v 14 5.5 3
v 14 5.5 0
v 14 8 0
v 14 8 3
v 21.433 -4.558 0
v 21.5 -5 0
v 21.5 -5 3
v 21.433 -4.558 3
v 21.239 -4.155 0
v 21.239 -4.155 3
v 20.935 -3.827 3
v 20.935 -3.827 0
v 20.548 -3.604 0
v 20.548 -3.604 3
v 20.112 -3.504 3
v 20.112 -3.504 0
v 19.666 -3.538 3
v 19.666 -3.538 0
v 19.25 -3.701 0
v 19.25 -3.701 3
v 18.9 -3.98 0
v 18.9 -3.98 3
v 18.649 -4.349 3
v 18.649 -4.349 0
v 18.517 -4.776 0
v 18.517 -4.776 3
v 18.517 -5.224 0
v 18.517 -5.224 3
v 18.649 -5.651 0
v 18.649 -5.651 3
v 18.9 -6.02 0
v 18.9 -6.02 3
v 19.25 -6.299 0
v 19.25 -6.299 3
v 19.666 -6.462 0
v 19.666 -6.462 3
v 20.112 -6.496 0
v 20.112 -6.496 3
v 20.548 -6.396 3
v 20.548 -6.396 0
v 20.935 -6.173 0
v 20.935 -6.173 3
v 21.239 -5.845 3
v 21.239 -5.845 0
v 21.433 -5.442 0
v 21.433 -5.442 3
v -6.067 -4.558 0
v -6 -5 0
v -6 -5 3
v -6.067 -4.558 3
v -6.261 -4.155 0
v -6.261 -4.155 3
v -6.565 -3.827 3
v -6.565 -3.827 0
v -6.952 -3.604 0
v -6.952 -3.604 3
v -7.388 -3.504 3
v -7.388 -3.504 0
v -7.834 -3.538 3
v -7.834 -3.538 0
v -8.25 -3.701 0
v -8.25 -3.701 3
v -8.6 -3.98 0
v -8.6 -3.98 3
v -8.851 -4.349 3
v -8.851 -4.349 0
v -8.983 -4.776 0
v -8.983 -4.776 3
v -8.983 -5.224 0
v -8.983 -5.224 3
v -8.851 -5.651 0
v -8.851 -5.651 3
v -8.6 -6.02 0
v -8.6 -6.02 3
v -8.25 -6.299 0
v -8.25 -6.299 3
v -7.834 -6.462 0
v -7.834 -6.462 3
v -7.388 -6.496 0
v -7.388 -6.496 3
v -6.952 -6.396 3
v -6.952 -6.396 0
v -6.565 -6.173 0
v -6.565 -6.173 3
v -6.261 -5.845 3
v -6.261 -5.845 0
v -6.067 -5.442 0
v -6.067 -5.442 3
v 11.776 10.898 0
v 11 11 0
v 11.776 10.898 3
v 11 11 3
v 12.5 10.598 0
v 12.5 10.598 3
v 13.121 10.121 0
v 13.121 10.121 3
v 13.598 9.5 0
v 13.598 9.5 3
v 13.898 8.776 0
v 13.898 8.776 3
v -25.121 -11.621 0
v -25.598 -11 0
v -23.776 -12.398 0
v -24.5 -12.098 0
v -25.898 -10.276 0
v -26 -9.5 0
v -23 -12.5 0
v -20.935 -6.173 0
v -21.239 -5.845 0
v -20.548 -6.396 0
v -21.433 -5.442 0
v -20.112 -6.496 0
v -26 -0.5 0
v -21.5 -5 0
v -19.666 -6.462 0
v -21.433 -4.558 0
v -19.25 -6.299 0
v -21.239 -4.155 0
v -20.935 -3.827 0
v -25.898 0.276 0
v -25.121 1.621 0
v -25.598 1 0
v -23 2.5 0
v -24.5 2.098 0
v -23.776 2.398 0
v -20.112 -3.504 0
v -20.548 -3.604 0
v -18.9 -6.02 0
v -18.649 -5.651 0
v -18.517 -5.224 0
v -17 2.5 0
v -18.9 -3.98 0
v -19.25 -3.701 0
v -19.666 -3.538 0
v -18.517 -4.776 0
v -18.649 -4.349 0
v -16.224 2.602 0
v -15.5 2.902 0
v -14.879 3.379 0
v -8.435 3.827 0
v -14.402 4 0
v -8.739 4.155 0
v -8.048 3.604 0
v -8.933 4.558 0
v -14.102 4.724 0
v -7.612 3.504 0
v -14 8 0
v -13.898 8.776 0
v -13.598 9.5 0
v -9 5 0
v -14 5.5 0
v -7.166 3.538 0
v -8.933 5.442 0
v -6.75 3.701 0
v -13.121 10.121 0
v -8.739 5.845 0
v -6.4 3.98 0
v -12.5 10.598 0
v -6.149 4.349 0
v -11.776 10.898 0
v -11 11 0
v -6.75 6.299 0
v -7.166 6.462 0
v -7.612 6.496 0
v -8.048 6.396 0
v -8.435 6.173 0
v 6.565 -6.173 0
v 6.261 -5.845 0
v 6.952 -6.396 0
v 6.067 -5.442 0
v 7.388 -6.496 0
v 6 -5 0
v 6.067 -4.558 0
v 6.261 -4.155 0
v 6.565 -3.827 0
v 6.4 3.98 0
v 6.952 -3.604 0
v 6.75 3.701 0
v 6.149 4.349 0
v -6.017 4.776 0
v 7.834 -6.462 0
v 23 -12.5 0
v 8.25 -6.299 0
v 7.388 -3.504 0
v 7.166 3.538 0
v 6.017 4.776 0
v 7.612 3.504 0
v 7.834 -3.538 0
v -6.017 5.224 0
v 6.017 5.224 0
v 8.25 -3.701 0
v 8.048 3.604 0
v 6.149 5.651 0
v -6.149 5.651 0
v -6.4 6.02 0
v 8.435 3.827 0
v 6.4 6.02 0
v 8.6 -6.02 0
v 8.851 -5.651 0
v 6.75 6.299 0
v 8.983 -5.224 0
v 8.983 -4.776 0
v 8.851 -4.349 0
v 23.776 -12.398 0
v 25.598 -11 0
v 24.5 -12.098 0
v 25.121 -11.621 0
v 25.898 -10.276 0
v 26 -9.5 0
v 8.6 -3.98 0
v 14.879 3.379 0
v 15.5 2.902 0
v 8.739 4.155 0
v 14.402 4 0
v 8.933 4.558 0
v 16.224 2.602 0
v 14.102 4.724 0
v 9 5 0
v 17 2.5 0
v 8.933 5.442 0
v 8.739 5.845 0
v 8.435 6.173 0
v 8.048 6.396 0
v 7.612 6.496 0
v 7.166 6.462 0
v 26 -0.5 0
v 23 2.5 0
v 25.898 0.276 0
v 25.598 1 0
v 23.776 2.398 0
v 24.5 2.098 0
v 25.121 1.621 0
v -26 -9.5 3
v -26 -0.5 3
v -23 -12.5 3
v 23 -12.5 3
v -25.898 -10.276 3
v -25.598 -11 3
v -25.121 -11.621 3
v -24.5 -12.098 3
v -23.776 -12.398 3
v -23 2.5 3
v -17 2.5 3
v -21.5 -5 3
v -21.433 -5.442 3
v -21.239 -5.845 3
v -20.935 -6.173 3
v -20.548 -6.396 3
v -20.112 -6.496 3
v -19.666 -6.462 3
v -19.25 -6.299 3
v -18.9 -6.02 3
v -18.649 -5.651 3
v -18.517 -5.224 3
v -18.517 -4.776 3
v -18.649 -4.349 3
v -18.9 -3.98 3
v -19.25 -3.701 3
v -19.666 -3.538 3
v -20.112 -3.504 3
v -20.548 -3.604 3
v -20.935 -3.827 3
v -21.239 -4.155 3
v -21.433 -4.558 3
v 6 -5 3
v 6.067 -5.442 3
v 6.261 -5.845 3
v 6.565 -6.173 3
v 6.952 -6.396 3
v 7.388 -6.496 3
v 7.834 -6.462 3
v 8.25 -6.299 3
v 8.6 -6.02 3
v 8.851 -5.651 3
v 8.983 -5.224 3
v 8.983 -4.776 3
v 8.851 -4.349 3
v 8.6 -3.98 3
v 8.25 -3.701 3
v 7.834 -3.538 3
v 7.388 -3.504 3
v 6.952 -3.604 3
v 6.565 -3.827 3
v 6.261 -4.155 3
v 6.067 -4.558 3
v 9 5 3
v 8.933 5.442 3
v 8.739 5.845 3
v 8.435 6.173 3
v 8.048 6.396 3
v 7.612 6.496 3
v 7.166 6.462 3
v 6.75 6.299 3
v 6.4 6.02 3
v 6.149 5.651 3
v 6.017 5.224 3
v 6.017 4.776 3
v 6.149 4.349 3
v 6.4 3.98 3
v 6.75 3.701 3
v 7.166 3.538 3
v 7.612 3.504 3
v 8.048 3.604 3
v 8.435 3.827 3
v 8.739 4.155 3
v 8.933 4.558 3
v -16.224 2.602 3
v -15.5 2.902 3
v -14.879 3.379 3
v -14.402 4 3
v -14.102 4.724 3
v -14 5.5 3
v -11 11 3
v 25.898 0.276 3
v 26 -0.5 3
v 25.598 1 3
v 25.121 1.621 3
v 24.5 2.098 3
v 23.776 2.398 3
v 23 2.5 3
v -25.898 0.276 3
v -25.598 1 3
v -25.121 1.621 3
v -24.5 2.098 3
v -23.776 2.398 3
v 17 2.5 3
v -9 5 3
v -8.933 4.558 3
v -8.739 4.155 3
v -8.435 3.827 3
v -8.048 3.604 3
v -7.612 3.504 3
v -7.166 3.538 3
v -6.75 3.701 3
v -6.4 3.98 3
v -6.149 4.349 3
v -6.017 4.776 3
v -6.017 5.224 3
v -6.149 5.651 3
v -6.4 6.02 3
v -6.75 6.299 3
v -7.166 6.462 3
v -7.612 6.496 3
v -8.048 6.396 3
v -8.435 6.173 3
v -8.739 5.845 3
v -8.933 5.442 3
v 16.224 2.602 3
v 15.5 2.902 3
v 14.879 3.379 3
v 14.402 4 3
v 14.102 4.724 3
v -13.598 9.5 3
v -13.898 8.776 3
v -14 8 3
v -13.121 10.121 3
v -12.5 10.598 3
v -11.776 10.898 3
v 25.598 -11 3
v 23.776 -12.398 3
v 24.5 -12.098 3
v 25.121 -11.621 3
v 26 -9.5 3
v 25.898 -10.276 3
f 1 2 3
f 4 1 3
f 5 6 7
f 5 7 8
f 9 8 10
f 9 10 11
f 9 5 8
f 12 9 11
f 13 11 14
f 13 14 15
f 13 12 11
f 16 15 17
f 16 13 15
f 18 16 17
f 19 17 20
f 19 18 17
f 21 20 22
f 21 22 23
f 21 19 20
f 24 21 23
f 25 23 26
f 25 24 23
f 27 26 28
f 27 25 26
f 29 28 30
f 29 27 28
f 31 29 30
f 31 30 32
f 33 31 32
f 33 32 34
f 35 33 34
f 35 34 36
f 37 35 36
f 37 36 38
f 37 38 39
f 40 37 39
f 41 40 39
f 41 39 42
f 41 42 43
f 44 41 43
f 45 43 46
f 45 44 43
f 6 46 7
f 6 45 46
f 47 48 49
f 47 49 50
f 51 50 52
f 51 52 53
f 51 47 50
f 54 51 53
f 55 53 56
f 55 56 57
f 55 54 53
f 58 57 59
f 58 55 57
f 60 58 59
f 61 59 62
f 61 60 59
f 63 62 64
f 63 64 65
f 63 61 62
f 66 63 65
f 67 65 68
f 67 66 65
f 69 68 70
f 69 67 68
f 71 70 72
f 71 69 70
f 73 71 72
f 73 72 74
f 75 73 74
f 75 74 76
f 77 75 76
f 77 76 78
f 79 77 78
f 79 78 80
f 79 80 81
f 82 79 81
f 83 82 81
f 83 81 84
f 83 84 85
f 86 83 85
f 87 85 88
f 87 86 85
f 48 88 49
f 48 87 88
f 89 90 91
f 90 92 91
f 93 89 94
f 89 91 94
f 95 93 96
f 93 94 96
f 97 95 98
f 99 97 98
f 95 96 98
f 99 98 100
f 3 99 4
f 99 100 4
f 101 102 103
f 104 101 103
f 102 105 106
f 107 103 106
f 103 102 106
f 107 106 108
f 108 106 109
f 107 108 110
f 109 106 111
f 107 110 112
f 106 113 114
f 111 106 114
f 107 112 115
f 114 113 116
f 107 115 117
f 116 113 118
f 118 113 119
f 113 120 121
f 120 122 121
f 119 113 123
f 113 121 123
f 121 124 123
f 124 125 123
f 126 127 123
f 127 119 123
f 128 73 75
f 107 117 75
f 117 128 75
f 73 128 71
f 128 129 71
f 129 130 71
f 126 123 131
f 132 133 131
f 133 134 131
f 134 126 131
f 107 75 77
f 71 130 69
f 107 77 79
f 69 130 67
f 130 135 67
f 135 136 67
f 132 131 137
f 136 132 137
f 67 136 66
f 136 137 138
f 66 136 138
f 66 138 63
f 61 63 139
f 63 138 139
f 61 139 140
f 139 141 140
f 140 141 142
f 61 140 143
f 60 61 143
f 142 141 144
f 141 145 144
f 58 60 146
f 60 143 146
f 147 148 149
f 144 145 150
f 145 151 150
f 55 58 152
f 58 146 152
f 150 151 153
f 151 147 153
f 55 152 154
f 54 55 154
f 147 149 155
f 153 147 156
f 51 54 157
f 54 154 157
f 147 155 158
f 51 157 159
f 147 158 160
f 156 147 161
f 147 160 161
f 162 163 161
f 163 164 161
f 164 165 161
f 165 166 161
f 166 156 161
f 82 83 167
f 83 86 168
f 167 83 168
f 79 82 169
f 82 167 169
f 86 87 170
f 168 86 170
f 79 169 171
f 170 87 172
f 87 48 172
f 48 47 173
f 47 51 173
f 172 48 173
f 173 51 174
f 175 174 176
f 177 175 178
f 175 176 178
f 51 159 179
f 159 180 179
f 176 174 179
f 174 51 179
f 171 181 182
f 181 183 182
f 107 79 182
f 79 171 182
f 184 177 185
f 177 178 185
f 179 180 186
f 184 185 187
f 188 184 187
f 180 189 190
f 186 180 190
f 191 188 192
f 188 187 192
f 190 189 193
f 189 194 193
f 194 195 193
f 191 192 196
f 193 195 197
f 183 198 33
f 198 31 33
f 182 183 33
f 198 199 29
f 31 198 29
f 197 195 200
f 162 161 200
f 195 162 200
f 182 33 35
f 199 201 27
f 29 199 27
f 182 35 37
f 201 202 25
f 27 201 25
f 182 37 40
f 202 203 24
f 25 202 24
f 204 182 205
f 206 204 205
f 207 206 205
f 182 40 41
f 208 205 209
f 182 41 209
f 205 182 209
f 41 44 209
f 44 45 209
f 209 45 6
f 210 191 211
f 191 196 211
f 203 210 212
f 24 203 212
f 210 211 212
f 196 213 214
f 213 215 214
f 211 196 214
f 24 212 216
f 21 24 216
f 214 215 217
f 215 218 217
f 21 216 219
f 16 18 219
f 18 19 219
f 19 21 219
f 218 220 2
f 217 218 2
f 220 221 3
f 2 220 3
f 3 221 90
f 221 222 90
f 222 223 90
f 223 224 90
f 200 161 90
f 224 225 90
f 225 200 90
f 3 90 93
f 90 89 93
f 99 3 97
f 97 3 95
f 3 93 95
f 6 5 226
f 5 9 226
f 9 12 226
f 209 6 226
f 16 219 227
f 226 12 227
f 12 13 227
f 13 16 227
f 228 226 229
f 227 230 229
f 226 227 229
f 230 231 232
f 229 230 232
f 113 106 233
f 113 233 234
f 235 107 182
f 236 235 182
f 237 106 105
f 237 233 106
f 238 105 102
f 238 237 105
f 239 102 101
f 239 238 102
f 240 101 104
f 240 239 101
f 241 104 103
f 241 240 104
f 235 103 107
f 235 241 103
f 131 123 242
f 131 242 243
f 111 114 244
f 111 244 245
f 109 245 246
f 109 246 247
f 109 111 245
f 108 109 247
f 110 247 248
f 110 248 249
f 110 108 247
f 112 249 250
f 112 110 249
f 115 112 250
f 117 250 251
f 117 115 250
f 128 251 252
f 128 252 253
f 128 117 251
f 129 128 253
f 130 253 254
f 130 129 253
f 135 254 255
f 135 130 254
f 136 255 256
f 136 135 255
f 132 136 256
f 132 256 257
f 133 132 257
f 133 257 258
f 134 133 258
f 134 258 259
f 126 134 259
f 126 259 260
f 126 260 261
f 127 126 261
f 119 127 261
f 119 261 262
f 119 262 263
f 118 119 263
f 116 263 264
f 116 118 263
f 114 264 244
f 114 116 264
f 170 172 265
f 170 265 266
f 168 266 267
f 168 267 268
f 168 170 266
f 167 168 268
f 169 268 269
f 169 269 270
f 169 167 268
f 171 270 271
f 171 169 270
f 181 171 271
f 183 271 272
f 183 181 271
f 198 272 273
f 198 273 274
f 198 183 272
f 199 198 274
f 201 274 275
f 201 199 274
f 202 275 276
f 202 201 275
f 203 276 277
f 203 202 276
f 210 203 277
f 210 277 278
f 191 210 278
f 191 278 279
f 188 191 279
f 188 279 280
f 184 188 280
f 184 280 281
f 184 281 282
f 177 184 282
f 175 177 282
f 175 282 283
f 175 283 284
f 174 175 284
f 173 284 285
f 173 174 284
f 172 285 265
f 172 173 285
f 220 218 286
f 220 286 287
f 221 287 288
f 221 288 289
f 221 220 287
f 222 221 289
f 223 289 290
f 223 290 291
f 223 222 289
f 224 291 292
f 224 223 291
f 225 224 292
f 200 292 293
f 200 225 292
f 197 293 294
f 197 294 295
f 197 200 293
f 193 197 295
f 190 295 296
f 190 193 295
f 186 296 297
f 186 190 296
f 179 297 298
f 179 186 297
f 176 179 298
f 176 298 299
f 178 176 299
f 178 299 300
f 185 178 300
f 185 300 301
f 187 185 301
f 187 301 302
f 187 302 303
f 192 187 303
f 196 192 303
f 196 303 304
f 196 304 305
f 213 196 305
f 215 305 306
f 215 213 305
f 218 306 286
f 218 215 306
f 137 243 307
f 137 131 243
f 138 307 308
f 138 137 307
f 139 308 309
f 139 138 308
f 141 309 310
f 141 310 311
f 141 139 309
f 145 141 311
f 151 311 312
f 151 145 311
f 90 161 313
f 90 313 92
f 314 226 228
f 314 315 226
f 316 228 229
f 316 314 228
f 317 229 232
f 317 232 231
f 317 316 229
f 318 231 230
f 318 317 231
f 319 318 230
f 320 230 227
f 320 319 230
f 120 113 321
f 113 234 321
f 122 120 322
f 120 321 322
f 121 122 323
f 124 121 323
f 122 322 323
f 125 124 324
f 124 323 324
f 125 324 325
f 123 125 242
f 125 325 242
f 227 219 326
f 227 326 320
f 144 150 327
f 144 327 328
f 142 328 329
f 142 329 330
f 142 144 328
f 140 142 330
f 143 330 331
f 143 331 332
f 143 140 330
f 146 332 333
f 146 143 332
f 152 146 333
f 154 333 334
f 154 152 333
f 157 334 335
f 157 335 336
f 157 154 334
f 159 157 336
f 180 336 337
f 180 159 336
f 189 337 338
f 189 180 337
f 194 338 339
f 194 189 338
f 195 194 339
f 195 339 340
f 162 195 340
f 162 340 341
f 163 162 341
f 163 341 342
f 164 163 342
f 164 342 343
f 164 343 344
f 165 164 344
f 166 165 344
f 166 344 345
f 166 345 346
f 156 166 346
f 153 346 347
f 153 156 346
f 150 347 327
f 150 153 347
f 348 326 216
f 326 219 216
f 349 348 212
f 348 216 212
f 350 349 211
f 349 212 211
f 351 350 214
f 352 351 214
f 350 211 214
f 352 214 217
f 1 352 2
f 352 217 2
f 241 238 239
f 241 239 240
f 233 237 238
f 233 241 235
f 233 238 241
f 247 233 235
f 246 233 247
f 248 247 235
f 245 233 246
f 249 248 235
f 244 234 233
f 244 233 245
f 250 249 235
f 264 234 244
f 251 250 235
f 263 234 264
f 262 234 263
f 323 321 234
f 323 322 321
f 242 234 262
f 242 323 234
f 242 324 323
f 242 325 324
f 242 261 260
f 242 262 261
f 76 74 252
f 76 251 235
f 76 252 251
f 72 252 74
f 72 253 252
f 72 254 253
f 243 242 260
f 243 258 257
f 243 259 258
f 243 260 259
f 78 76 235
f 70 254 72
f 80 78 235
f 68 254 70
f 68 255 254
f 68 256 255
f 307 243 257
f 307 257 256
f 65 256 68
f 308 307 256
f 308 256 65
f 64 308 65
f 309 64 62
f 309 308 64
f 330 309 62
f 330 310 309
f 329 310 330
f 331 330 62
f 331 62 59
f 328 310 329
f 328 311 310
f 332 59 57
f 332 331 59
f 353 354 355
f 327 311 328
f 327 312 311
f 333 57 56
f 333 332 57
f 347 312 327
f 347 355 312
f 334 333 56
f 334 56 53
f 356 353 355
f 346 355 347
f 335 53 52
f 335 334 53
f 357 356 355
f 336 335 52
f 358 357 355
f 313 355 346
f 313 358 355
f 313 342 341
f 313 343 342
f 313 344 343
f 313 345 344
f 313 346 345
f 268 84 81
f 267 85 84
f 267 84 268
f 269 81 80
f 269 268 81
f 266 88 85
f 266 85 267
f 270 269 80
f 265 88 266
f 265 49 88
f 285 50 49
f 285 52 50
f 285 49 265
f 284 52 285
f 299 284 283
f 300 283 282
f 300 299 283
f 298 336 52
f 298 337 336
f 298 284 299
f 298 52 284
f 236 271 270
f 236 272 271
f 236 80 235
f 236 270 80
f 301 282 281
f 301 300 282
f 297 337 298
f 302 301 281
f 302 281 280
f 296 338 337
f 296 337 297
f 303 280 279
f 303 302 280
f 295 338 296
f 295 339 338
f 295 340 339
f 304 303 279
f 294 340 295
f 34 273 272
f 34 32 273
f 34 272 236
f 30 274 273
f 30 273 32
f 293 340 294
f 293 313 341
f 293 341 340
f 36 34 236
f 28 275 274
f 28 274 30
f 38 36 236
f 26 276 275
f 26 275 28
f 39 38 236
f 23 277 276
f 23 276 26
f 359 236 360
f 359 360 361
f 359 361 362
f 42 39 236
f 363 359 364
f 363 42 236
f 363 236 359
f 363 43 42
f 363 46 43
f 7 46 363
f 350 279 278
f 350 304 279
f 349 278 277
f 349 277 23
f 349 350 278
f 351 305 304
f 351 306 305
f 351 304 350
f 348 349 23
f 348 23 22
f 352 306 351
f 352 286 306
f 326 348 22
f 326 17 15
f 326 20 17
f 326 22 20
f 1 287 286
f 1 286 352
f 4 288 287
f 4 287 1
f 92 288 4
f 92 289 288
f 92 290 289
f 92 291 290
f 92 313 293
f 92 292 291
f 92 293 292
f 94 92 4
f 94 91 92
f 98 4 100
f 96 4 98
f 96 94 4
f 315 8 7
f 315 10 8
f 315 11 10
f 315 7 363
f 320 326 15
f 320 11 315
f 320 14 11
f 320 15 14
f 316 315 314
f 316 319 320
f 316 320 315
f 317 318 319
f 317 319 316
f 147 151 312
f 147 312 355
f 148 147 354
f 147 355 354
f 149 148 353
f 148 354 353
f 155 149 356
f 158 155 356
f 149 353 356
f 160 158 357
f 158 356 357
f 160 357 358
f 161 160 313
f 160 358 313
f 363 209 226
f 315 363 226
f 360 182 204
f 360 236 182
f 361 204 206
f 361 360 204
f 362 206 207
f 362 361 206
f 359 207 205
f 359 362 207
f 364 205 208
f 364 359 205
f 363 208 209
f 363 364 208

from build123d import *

# Parameters (mm, degrees)
SKETCH_1_W      = 28
SKETCH_1_H      = 22
SKETCH_1_R      = 1.5
EXTRUDE_1_DEPTH = 3
EXTRUDE_START   = -3
SKETCH_2_W      = 52
SKETCH_2_H      = 15
SKETCH_2_R      = 1.5
EXTRUDE_3_DEPTH = 3
FILLET_1_R      = 3


with BuildPart() as part:
    # 草图1 → 凸台-拉伸1 (new body)
    with BuildSketch(Plane.XY):
        Rectangle(SKETCH_1_W, SKETCH_1_H)
        with Locations((7.5, 5)):
            Circle(SKETCH_1_R, mode=Mode.SUBTRACT)
        with Locations(Location((7.5, -5, 0), (0, 0, 180))):
            Circle(SKETCH_1_R, mode=Mode.SUBTRACT)
        with Locations((-7.5, -5)):
            Circle(SKETCH_1_R, mode=Mode.SUBTRACT)
        with Locations(Location((-7.5, 5, 0), (0, 0, 180))):
            Circle(SKETCH_1_R, mode=Mode.SUBTRACT)
    extrude(amount=EXTRUDE_1_DEPTH)

    # 草图2 → 凸台-拉伸3 (add)
    with BuildSketch(Plane.XY.offset(3).offset(EXTRUDE_START)):
        with Locations((0, -5)):
            Rectangle(SKETCH_2_W, SKETCH_2_H)
        with Locations((20, -5)):
            Circle(SKETCH_2_R, mode=Mode.SUBTRACT)
        with Locations(Location((-20, -5, 0), (0, 0, 180))):
            Circle(SKETCH_2_R, mode=Mode.SUBTRACT)
        with Locations((-7.5, -5)):
            Circle(SKETCH_2_R, mode=Mode.SUBTRACT)
        with Locations(Location((7.5, -5, 0), (0, 0, 180))):
            Circle(SKETCH_2_R, mode=Mode.SUBTRACT)
    extrude(amount=EXTRUDE_3_DEPTH)

    # 圆角1
    fillet_1_edges = [part.edges().sort_by_distance(p)[0] for p in [
        (-14, 2.5, 1.5),
        (-26, 2.5, 1.5),
        (26, 2.5, 1.5),
        (26, -12.5, 1.5),
        (-26, -12.5, 1.5),
        (14, 2.5, 1.5),
        (-14, 11, 1.5),
        (14, 11, 1.5),
    ]]
    fillet(fillet_1_edges, radius=FILLET_1_R)


solid = part.part
